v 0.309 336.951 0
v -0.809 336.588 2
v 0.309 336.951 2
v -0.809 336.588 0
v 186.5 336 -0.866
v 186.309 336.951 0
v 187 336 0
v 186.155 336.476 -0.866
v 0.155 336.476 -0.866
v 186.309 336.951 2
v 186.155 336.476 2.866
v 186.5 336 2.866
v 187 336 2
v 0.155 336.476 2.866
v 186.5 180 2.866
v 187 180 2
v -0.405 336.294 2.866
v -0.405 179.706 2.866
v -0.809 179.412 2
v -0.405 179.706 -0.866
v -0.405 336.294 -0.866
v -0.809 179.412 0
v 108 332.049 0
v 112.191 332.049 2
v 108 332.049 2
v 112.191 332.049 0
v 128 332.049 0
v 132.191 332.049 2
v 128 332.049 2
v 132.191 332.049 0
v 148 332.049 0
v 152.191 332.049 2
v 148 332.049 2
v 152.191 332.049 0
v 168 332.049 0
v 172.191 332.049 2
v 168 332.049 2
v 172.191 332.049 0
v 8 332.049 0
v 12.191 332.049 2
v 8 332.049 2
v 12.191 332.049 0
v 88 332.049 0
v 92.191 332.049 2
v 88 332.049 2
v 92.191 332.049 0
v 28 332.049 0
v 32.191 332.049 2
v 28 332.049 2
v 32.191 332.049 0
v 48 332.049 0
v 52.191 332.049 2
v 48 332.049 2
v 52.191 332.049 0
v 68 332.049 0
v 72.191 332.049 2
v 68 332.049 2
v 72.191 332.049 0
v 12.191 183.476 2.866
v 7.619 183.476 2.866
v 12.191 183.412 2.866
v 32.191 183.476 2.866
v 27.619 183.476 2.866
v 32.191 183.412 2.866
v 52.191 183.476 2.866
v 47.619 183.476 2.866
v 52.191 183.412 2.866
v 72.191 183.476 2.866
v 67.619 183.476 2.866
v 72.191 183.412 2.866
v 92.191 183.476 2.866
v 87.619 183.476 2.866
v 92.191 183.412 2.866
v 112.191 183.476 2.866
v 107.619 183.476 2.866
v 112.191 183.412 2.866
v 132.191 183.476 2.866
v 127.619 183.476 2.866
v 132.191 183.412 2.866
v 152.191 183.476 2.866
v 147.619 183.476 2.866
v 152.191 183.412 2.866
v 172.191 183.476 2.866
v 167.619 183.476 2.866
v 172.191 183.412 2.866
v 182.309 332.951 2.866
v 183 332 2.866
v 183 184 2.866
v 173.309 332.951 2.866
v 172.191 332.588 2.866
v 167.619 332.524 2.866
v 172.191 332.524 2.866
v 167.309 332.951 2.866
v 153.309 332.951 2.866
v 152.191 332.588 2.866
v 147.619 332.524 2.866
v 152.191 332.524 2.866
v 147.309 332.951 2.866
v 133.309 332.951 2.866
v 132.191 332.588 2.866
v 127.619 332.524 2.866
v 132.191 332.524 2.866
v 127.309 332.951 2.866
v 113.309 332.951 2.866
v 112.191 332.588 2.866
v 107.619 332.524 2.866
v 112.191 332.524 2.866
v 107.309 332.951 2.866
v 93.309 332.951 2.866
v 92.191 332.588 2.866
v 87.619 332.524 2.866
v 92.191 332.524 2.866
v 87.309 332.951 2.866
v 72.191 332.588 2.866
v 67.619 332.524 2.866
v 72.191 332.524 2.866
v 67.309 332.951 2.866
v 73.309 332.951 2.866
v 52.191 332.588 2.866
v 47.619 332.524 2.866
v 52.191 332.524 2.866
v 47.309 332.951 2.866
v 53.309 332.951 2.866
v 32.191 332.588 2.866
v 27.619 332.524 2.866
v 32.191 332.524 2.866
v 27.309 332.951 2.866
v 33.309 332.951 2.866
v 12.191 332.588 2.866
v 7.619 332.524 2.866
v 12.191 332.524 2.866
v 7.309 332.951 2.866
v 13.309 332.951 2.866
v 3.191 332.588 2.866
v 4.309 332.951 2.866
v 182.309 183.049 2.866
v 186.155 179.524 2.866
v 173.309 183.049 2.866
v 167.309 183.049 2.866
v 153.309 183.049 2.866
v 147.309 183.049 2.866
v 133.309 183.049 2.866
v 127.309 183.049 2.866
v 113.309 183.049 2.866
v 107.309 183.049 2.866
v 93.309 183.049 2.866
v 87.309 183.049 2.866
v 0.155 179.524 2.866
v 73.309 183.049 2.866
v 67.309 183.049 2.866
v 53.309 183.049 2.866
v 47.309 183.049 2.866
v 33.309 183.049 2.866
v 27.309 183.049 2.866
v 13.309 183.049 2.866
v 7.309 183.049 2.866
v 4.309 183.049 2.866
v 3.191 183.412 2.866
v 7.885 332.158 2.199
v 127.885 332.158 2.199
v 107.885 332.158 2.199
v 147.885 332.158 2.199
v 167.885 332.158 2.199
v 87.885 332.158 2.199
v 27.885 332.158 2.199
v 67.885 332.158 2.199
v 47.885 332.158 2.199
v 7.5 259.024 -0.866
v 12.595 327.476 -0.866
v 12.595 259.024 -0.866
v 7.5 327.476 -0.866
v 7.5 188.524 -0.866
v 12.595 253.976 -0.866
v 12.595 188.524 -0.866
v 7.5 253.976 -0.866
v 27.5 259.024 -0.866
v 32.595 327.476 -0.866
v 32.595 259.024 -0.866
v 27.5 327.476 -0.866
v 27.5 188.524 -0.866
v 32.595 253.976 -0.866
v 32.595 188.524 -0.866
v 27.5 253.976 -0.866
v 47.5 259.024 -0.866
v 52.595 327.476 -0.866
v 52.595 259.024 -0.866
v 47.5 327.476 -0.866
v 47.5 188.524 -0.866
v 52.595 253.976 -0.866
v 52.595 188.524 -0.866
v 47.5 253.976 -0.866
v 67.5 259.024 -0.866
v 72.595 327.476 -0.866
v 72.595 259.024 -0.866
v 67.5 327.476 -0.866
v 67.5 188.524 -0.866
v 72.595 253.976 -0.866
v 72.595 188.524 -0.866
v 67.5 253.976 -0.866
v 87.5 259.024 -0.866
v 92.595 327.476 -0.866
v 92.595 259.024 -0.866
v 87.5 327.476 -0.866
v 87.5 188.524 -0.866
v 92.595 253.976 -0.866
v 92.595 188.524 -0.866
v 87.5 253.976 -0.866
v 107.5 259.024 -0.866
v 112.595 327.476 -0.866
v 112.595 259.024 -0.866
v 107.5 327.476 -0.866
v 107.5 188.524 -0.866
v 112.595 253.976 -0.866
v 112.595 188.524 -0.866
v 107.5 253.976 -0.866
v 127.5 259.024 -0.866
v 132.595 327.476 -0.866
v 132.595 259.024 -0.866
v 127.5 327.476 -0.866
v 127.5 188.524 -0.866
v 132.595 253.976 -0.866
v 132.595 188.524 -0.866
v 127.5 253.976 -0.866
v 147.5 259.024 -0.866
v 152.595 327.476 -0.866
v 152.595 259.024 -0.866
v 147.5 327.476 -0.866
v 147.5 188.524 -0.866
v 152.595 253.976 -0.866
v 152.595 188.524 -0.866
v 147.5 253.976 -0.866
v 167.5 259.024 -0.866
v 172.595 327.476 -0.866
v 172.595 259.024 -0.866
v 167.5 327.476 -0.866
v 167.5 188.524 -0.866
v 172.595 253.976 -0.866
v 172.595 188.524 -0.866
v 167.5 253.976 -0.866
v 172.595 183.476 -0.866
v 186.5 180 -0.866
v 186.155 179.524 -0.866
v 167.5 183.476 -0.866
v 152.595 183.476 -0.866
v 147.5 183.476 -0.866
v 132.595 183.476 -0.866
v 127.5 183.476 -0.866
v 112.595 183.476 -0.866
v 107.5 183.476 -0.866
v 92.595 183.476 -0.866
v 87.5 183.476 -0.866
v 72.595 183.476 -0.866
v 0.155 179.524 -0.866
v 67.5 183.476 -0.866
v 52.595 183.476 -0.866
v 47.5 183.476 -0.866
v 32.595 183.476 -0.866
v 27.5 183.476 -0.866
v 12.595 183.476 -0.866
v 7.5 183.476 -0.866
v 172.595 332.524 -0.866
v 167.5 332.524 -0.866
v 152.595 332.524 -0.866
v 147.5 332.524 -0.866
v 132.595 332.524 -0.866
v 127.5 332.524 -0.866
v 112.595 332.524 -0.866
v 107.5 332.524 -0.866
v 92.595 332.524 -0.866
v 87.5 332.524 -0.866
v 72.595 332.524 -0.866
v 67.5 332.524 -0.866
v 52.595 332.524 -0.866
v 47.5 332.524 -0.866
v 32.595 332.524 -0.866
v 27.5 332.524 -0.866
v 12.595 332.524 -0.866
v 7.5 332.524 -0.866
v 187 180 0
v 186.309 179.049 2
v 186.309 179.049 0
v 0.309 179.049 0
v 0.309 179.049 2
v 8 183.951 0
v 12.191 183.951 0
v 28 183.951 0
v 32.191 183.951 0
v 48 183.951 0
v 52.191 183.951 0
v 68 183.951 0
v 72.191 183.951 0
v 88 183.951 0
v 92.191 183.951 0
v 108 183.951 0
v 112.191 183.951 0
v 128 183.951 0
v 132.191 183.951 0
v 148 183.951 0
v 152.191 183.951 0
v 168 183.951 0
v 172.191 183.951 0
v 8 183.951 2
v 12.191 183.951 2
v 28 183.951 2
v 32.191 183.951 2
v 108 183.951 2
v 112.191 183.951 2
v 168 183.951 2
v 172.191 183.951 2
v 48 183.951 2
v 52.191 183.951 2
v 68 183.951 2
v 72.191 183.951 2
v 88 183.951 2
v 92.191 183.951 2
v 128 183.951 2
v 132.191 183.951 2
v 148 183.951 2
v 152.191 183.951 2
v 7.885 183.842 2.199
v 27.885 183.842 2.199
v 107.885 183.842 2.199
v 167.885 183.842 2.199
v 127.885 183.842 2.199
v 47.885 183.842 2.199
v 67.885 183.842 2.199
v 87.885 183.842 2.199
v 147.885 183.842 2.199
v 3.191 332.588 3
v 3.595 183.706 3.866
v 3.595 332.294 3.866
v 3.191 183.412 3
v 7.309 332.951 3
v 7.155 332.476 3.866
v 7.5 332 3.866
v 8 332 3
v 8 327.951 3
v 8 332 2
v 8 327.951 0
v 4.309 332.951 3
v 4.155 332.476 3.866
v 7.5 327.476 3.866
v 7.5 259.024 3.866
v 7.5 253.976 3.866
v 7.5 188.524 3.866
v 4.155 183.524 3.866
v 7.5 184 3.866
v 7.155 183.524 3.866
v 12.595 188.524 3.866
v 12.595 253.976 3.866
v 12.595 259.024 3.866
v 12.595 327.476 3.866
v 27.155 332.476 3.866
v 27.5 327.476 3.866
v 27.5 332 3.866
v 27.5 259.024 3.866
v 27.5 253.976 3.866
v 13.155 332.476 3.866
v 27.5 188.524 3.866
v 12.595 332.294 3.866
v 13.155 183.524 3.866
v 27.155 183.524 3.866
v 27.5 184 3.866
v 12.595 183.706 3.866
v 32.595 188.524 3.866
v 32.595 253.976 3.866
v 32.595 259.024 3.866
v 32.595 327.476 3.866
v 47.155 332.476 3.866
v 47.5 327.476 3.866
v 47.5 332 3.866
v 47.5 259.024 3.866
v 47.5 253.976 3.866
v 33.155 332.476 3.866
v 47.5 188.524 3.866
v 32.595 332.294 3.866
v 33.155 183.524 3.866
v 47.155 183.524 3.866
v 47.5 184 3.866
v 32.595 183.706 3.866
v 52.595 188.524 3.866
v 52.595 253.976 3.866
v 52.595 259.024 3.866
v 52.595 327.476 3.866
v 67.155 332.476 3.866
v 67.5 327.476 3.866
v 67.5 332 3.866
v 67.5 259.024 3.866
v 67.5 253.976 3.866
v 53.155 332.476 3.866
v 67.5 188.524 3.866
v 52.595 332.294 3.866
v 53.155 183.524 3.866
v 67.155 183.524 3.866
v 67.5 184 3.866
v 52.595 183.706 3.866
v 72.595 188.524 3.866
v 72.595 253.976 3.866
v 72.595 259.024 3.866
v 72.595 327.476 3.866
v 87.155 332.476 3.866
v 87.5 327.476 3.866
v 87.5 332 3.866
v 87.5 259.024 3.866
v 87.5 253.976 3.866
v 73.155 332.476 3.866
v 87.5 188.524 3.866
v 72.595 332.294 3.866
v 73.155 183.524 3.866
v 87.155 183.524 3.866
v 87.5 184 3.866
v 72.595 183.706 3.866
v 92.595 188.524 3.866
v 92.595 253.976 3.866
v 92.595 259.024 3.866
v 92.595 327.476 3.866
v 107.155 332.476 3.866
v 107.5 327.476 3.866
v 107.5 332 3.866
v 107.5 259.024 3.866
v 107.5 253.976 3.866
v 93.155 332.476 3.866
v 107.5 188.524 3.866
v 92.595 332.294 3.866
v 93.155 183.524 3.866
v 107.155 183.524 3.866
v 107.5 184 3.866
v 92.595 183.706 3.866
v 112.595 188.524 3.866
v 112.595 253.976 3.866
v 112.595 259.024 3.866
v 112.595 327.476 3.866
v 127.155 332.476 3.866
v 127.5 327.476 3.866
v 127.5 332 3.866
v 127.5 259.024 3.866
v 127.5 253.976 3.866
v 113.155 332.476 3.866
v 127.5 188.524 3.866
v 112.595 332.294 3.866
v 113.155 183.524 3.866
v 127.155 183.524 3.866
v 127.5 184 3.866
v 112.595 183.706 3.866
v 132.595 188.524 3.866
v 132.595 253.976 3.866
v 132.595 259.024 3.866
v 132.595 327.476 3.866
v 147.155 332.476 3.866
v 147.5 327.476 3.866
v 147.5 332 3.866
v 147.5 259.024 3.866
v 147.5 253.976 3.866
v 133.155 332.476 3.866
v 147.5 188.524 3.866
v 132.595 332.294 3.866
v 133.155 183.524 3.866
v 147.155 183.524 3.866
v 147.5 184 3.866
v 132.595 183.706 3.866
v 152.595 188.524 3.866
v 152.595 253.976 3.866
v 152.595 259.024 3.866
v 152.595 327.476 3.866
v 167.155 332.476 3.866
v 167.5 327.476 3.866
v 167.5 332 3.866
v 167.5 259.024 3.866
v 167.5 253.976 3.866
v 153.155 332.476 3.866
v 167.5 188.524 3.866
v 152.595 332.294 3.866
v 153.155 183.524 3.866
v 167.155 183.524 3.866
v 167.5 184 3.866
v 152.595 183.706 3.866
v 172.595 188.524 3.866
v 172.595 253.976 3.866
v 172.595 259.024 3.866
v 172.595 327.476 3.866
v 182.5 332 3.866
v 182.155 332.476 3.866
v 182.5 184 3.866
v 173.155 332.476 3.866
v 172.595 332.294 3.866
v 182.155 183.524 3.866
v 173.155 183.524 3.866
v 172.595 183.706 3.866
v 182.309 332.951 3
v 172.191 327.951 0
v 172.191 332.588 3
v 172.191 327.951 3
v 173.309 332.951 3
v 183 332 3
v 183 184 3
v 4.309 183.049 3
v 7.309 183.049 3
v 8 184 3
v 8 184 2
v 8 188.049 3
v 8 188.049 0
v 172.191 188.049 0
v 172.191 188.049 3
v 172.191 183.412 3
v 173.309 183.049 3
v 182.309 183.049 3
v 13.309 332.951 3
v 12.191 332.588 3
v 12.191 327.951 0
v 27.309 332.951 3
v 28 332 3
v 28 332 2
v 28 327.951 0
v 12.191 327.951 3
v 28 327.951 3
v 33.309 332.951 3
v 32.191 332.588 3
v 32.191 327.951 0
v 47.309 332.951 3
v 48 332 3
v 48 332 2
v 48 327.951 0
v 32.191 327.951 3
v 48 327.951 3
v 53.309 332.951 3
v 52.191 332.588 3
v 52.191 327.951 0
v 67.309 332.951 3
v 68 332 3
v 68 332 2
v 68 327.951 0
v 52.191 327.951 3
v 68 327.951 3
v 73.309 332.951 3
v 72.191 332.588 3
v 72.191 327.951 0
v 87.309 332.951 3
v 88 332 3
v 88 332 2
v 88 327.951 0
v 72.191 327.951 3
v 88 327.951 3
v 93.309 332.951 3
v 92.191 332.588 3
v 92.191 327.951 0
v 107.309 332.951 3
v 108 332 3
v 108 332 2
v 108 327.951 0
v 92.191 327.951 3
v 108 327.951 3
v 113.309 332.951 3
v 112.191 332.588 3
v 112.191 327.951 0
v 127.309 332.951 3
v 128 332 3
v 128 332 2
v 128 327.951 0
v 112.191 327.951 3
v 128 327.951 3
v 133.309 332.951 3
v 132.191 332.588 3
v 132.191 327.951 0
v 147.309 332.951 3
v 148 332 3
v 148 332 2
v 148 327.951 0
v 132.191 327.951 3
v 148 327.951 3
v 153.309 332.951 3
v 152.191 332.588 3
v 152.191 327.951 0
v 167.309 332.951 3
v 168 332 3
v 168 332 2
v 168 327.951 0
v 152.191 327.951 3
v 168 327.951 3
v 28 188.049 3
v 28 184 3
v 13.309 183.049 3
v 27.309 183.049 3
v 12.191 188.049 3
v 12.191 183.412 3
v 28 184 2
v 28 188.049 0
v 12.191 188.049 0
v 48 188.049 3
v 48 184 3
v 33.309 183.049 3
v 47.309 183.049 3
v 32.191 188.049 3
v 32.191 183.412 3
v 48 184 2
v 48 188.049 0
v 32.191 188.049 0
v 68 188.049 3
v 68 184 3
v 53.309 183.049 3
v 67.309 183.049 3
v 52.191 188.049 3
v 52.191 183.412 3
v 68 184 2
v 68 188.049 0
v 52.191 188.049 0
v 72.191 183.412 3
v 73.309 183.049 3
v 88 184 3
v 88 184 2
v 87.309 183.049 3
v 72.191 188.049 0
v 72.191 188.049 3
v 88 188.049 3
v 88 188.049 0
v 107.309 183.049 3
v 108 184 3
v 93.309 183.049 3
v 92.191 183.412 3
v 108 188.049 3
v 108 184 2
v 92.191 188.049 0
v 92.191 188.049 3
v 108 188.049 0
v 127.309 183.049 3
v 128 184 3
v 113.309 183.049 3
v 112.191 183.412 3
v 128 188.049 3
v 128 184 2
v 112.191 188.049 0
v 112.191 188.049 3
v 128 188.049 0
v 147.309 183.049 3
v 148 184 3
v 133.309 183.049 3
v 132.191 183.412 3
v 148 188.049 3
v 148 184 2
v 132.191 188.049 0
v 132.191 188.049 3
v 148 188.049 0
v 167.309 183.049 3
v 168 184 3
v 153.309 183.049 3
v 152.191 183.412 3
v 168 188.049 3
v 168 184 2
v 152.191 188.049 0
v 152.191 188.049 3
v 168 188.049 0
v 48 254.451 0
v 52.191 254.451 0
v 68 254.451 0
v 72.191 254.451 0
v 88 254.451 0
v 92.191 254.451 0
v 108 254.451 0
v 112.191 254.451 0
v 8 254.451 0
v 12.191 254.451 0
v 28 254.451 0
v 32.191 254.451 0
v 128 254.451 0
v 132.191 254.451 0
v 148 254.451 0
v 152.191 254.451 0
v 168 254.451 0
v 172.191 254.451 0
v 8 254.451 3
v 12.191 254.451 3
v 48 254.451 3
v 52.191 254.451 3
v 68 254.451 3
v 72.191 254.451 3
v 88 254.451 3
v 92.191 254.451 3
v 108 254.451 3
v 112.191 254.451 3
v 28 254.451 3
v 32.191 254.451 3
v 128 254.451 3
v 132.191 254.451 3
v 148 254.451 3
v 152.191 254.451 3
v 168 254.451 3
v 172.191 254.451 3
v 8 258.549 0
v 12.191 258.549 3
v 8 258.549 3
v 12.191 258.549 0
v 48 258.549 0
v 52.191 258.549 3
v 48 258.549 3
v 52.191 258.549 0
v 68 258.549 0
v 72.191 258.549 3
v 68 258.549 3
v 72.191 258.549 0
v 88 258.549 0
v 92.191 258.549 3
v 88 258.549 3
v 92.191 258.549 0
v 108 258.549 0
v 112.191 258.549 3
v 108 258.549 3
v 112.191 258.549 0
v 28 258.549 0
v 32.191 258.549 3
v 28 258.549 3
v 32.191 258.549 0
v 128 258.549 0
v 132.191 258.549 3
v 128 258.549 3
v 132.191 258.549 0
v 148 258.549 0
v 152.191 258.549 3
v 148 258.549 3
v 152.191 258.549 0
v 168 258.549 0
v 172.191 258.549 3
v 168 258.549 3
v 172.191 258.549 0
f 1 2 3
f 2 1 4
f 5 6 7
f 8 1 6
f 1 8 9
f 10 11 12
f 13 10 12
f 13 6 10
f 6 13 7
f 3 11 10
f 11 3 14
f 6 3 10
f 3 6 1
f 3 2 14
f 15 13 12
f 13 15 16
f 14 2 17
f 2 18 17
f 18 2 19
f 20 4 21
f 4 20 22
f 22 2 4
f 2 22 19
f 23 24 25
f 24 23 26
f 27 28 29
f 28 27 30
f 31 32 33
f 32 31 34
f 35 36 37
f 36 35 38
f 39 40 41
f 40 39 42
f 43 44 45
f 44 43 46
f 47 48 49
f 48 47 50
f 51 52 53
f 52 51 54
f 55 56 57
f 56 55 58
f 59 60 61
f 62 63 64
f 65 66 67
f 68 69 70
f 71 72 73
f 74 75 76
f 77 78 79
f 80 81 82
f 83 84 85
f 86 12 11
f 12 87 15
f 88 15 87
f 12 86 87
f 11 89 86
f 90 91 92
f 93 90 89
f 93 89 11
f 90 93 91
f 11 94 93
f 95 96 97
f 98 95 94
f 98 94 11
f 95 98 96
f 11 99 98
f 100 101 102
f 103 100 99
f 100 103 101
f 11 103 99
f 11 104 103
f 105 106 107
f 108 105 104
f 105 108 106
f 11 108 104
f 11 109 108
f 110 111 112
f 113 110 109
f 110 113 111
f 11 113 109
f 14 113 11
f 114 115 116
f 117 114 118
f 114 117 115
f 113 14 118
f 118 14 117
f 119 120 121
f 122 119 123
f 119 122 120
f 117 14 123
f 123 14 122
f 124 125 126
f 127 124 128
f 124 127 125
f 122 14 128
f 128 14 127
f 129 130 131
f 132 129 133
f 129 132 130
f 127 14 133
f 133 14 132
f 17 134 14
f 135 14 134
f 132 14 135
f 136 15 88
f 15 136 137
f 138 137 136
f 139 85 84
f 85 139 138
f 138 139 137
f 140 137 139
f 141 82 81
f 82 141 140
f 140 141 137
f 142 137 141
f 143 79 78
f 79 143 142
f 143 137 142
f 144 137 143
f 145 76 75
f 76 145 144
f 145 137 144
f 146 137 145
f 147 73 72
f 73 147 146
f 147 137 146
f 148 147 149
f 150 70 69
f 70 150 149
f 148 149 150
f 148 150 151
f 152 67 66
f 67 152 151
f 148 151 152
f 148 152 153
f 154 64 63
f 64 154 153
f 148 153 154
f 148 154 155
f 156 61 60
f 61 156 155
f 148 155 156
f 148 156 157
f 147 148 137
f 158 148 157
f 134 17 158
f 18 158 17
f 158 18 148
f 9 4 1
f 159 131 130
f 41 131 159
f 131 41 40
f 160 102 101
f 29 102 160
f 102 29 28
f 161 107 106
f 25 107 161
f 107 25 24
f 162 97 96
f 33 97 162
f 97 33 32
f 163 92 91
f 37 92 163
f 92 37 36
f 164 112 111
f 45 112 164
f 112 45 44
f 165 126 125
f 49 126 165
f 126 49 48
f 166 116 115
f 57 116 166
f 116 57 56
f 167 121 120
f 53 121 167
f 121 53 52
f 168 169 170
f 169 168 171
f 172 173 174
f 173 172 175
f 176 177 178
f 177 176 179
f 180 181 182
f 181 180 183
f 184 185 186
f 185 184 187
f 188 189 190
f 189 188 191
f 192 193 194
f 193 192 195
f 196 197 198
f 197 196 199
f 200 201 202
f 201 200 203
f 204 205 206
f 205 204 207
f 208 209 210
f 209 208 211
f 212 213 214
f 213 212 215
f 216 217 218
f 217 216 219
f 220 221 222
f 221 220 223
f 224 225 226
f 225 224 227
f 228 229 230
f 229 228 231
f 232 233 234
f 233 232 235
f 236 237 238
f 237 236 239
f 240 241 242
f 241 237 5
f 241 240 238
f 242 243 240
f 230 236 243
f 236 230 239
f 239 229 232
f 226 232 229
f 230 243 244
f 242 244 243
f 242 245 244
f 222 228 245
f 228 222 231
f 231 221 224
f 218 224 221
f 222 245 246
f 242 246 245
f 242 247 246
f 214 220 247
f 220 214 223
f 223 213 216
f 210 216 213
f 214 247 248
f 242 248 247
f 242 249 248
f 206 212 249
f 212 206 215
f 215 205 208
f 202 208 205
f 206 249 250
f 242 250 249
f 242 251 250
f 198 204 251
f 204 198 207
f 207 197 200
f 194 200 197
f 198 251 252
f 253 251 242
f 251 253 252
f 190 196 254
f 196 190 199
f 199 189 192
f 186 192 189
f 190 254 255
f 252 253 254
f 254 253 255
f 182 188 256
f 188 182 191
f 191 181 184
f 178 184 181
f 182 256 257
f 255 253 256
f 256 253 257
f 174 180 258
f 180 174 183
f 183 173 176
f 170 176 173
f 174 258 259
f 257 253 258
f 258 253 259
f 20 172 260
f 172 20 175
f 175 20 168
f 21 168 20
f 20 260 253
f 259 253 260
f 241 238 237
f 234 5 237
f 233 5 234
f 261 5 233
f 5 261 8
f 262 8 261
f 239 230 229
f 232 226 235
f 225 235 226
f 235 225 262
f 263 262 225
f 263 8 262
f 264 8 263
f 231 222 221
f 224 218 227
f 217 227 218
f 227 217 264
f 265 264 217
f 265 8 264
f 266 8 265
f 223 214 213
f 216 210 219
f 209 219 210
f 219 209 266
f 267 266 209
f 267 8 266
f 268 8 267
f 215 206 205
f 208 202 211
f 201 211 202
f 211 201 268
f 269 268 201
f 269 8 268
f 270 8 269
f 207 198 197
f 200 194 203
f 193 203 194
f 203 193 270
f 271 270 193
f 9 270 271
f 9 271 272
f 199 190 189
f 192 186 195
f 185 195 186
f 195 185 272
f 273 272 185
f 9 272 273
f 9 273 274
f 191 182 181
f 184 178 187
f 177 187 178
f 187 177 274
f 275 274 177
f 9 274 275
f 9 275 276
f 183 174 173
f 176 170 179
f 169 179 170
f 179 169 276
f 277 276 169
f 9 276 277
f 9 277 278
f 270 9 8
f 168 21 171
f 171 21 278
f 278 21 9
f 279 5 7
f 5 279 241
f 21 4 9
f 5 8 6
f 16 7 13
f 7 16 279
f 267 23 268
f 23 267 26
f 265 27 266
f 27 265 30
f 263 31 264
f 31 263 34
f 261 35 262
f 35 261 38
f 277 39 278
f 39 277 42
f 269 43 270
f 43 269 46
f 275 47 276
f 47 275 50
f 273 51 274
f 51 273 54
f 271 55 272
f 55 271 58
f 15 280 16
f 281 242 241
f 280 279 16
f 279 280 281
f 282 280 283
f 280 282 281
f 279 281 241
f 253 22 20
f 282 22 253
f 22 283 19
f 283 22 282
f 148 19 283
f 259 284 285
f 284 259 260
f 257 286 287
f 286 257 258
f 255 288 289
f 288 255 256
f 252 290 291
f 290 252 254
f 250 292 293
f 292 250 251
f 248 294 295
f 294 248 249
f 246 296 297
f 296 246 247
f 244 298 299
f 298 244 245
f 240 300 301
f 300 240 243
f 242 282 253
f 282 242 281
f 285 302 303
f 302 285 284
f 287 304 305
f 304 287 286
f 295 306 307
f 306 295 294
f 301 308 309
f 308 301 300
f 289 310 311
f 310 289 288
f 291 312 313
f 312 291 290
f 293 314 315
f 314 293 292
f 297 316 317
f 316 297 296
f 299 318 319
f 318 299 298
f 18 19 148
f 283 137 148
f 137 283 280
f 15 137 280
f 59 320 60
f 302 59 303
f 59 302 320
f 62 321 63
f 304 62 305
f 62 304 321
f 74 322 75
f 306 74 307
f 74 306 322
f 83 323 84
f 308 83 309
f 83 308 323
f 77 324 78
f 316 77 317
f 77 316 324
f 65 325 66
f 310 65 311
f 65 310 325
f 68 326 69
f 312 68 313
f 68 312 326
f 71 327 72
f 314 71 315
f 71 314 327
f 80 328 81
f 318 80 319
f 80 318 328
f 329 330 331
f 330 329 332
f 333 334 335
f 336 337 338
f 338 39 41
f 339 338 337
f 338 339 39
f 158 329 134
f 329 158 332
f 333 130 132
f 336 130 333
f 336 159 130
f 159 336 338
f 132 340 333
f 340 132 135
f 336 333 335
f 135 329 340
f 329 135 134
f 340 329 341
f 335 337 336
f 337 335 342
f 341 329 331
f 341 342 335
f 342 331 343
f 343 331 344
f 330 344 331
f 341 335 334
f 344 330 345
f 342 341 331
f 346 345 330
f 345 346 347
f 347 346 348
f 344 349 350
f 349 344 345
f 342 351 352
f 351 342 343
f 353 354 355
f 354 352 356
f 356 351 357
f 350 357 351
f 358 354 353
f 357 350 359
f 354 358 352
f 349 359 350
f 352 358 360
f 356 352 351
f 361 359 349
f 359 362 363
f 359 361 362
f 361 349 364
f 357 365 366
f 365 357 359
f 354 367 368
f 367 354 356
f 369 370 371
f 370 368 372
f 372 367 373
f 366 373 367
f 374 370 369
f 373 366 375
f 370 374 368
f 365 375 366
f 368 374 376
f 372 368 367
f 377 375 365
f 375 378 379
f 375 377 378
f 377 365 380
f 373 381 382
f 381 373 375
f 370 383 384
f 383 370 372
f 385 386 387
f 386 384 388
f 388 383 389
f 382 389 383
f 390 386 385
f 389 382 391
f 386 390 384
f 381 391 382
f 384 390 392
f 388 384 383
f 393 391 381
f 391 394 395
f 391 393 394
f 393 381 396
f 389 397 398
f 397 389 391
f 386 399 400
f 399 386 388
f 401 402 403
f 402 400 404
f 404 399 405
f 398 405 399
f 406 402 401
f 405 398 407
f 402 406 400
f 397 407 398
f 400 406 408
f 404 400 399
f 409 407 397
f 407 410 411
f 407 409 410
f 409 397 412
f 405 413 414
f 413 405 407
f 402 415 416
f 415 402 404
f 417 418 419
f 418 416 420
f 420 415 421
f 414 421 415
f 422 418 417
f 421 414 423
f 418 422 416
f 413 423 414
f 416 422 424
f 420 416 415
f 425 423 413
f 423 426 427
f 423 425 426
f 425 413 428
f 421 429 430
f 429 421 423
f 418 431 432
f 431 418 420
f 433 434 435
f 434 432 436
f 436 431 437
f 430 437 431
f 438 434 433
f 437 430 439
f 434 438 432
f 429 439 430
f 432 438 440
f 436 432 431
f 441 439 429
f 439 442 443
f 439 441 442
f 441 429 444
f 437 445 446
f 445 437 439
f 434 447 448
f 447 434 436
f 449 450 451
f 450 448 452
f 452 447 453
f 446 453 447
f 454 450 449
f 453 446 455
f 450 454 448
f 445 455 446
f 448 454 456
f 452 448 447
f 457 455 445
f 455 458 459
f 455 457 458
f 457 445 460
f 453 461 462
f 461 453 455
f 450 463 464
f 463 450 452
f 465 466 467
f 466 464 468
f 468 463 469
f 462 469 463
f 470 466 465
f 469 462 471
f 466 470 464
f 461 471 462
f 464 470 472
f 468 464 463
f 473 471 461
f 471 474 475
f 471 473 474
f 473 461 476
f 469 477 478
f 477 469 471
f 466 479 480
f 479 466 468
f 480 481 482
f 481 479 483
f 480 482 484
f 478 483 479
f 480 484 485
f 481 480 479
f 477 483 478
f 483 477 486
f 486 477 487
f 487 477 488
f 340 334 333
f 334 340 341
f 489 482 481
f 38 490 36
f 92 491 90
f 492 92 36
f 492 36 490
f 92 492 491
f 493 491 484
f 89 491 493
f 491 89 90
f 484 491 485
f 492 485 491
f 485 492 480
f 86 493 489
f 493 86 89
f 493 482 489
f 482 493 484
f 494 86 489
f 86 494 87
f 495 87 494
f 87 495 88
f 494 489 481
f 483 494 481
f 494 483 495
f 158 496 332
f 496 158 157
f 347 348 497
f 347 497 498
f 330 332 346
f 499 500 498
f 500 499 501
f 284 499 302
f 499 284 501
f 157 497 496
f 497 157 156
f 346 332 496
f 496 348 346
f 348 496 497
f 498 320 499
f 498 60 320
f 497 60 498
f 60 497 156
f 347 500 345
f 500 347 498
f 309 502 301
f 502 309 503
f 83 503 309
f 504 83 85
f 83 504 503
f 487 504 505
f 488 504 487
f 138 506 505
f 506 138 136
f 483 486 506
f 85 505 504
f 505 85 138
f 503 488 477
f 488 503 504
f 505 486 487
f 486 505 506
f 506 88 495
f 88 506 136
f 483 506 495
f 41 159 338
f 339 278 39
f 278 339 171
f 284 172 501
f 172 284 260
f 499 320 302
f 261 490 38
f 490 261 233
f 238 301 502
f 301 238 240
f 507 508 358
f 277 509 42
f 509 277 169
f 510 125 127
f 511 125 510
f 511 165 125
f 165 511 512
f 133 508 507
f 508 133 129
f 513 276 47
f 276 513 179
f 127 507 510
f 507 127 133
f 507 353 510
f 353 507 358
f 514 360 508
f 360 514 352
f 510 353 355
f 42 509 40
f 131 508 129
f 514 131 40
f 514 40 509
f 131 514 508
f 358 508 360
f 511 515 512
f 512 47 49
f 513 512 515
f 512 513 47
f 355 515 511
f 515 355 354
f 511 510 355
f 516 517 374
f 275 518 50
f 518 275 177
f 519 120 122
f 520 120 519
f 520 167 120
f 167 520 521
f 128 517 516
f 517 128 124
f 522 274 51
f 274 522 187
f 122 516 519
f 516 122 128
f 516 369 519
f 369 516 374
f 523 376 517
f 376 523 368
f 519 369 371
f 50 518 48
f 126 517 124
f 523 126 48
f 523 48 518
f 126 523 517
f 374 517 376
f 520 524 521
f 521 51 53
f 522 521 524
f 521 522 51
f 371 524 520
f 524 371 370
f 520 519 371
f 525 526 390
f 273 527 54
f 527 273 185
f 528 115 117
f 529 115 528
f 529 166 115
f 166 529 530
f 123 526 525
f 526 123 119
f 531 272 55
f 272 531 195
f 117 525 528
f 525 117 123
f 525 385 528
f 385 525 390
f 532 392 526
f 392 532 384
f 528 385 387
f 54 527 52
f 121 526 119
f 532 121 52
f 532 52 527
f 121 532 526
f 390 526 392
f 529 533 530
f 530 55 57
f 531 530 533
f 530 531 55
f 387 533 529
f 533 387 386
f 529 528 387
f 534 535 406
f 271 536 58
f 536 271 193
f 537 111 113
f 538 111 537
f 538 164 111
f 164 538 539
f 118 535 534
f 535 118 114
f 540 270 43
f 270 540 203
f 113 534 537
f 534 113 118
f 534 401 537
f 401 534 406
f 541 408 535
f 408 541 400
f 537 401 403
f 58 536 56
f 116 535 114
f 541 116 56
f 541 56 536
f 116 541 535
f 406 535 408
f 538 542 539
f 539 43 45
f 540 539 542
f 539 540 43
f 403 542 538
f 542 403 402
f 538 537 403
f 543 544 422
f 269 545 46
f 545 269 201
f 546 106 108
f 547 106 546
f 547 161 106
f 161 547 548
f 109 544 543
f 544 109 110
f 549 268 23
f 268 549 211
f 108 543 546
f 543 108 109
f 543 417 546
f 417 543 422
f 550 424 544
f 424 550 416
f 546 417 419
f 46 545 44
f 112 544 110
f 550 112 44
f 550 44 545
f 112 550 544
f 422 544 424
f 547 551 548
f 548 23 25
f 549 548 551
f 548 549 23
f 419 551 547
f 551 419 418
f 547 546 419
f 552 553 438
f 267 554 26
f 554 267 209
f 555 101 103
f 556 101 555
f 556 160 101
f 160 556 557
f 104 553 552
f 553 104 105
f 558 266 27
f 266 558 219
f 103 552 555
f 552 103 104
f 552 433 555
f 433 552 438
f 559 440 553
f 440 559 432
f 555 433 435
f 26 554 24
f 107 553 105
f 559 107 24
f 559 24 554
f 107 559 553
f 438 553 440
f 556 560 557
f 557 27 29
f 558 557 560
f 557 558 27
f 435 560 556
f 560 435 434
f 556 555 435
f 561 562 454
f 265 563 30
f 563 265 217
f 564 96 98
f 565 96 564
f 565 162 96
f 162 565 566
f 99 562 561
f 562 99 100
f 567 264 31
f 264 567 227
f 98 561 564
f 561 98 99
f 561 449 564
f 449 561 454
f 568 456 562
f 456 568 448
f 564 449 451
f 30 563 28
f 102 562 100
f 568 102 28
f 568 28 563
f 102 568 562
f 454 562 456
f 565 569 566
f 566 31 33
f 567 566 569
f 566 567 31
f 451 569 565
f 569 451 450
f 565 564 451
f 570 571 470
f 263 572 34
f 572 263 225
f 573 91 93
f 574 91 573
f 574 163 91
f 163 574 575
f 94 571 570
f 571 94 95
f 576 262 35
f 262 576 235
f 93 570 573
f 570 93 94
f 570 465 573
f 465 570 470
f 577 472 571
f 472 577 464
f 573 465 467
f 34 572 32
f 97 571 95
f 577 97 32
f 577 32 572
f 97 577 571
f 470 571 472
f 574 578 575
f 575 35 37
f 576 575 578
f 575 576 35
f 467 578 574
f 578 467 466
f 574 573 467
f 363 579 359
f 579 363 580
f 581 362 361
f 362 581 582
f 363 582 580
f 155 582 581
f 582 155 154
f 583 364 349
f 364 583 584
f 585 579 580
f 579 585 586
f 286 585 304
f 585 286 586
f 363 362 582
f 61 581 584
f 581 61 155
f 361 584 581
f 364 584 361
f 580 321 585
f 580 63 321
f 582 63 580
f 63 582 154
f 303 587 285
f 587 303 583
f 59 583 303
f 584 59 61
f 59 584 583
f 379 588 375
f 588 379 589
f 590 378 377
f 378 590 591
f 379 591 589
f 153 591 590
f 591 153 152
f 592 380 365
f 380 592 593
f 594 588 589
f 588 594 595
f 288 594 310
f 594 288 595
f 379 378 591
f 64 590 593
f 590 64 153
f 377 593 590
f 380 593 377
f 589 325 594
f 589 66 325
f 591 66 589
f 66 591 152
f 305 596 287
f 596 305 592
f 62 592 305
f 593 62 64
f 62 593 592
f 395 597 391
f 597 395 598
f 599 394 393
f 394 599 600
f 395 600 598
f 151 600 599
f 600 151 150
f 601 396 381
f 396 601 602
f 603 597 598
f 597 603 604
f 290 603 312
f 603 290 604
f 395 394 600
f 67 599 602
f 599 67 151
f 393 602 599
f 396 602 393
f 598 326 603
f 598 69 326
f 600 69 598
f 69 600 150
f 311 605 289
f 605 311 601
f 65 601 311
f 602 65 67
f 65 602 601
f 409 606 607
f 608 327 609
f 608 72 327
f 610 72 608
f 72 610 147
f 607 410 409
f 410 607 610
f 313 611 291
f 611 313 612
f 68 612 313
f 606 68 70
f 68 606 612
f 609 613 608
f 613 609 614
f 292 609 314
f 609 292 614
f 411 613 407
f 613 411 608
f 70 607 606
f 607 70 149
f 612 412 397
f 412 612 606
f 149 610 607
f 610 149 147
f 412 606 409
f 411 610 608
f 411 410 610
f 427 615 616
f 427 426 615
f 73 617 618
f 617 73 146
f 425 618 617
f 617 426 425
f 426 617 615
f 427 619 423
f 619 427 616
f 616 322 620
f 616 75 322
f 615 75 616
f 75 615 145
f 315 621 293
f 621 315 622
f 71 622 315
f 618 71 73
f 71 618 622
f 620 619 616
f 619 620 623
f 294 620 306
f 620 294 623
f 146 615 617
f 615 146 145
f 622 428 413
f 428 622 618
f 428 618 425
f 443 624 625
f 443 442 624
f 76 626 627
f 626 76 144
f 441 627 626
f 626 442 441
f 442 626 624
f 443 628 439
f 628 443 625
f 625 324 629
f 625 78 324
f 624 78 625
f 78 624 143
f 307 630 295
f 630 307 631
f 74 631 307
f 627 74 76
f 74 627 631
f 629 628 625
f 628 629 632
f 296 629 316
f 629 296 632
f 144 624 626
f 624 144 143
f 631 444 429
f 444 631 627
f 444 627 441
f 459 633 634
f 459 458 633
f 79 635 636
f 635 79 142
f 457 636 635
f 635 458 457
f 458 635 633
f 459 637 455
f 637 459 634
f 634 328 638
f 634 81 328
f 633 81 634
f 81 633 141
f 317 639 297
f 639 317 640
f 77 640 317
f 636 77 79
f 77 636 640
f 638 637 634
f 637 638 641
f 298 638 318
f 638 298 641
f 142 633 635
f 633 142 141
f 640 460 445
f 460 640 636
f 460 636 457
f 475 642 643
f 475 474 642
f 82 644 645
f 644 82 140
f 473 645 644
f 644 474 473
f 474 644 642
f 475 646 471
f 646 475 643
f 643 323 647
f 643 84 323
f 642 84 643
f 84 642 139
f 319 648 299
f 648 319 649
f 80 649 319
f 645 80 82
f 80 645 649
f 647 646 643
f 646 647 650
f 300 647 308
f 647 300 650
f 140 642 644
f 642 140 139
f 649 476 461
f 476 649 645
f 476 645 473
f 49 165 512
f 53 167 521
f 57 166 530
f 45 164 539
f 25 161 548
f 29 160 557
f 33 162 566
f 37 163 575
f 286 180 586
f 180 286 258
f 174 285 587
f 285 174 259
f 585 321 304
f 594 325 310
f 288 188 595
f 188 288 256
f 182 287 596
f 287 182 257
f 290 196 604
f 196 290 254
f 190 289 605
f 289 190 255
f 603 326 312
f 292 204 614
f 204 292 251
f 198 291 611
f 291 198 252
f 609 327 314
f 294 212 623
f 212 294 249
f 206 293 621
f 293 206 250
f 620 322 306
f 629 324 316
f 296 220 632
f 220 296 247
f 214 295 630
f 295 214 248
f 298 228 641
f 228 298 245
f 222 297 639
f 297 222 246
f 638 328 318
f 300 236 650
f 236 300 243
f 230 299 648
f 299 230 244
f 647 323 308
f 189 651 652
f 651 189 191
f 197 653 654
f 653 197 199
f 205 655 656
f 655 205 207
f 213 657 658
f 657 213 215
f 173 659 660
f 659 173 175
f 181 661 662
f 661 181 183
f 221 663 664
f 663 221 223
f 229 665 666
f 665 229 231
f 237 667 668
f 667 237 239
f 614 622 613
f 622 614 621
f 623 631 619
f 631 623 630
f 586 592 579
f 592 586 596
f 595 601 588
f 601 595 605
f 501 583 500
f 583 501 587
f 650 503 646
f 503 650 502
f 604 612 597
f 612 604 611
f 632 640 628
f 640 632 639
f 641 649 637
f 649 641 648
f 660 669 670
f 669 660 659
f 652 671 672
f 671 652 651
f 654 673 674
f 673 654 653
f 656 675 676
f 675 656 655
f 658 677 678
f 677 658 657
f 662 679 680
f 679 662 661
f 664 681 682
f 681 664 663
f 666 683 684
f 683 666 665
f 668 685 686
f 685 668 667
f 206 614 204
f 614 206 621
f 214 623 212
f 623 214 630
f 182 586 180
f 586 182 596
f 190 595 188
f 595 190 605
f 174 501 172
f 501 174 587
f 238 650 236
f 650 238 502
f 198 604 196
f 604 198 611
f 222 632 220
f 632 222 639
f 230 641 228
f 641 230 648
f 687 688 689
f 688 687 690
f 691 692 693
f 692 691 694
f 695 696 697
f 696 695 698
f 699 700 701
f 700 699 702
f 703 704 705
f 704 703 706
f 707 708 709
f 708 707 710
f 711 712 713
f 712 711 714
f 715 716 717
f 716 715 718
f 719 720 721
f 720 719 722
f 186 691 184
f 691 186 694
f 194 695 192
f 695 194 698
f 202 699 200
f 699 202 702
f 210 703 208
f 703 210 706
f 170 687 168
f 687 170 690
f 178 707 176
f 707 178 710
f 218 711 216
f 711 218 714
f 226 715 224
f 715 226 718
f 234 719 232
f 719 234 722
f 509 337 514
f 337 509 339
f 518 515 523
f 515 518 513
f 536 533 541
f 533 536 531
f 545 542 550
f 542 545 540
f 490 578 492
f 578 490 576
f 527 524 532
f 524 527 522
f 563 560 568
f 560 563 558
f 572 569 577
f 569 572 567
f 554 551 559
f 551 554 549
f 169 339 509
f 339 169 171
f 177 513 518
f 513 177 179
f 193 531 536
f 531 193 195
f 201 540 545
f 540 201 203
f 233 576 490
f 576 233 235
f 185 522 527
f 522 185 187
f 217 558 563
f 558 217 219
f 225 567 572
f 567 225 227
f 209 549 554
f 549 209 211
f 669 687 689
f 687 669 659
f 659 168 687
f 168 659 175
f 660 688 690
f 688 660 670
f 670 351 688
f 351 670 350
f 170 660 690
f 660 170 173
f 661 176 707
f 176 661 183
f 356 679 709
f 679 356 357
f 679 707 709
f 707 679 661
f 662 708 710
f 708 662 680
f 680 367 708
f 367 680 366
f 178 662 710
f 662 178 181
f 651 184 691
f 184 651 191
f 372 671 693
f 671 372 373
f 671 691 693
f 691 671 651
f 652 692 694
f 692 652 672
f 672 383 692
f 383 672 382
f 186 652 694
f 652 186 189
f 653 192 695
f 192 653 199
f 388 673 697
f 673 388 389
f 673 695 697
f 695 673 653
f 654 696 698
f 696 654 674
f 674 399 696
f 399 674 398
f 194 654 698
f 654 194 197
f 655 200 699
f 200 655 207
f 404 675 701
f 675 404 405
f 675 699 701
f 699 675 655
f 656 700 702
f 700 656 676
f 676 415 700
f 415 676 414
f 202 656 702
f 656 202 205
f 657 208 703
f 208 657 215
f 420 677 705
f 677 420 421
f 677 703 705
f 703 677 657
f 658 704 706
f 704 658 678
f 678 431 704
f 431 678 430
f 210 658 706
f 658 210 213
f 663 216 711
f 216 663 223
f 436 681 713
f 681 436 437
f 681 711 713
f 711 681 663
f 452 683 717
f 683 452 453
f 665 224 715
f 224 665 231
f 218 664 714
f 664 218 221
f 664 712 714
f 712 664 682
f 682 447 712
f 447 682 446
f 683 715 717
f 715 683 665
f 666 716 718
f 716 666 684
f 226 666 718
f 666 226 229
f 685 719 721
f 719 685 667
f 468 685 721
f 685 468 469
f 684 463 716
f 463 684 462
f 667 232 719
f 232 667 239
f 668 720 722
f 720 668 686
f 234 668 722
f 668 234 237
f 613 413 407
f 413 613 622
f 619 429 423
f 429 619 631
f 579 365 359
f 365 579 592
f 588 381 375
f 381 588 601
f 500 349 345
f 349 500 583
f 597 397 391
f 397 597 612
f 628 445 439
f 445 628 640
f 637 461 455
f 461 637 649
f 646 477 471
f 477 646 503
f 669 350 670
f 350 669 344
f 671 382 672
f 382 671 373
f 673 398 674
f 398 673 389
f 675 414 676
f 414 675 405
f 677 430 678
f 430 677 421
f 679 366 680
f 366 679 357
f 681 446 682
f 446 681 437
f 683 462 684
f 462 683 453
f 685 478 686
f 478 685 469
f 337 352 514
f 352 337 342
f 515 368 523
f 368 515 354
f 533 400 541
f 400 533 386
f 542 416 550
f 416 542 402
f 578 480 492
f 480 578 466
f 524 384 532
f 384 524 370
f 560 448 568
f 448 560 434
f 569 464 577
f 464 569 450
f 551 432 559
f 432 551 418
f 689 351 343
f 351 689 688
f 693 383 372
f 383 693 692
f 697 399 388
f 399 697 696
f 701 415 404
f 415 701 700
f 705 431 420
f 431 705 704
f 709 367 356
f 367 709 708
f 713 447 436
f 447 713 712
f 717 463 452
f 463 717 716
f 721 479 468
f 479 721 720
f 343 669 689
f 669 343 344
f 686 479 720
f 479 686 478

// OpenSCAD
minkowskiRadius = 1;

/*
  x - inner width of box - X
  y - inner length of box (Size of edge with the outlet cord) - Y
  height - inner height of box - Z
  wallThickness - Thickness of walls of the box
  cutoutSpacing - Spacing between cutouts for usb cord exits
  cutoutWidth - Width of the cutout for USB cables
  chargerX - Width of the charger
  chargerY - Length of the charger (Size of the edge with the outlet cord)
  chargerHeight - Height of charger
  outletCutoutWidth - Width of the cutout for the power cord
*/
module mainBox(x, y, height, wallThickness, cutoutSpacing, cutoutWidth, chargerX, chargerY, chargerHeight, outletCutoutWidth) {
  innerX = x + minkowskiRadius * 2;
  innerY = y + minkowskiRadius * 2;
  innerHeight = height + minkowskiRadius * 2;
  assert(innerHeight > wallThickness);
  outerX = innerX + wallThickness * 2;
  outerY = innerY + wallThickness * 2;
  outerHeight = innerHeight + wallThickness;
  slotOverhang = 0.2; // excess size so the slots will fully cutout
  outletCutoutWidth = outletCutoutWidth ? outletCutoutWidth : 10;


  difference() {
    cube([outerX, outerY, outerHeight]);
    translate([wallThickness, wallThickness, wallThickness])
      #cube([innerX, innerY, innerHeight + slotOverhang]);
    // side slots
    for (x = [wallThickness + cutoutWidth/2 : cutoutSpacing : innerX]) {
      translate([x, -slotOverhang/2, wallThickness * 1.5])
        #cube([cutoutWidth, wallThickness + slotOverhang, innerHeight - wallThickness * 2]);
      translate([x, outerY - wallThickness - slotOverhang/2, wallThickness * 1.5])
        #cube([cutoutWidth, wallThickness + slotOverhang, innerHeight - wallThickness * 2]);
    }
    // Power cord cutout
    translate([0 - slotOverhang/2, outerY/2 - outletCutoutWidth/2, wallThickness])
      #cube([wallThickness + slotOverhang, outletCutoutWidth, innerHeight - wallThickness]);
  }
  
  translate([wallThickness, (wallThickness + innerY - chargerY)/2, wallThickness])
    difference() {
        cube([chargerX + wallThickness, chargerY + wallThickness, chargerHeight]);
        translate([0, wallThickness/2, 0])
            cube([chargerX + wallThickness/2, chargerY, chargerHeight]);
    }
}

module boxLid(x, y, wallThickness, cutoutSize, cutoutSpacing) {
  cutoutOverhang = 0.2;
  outerX = x + wallThickness * 2 + minkowskiRadius * 2;
  outerY = y + wallThickness * 2 + minkowskiRadius * 2;
  perimeterHeight = wallThickness;
  fullHeight = wallThickness * 1.5;
  difference() {
    union() {
      cube([outerX, outerY, perimeterHeight]);
      translate([wallThickness + minkowskiRadius * 2, wallThickness + minkowskiRadius * 2, 0])
        cube([x - minkowskiRadius * 2, y - minkowskiRadius * 2, fullHeight]);
    }
    // cutouts for top dividers
    for (cutoutX = [wallThickness * 3 : cutoutSpacing : outerX]) {
      translate([cutoutX + minkowskiRadius, wallThickness + minkowskiRadius, -cutoutOverhang/2])
        #cube([cutoutSize + minkowskiRadius, cutoutSize + minkowskiRadius, fullHeight + cutoutOverhang]);
      translate([cutoutX + minkowskiRadius, outerY - wallThickness - cutoutSize - minkowskiRadius * 2, -cutoutOverhang/2])
        #cube([cutoutSize + minkowskiRadius, cutoutSize + minkowskiRadius, fullHeight + cutoutOverhang]);
        translate([cutoutX + minkowskiRadius, (outerY - wallThickness - cutoutSize - minkowskiRadius * 2)/2, -cutoutOverhang/2])
        #cube([cutoutSize + minkowskiRadius, cutoutSize + minkowskiRadius, fullHeight + cutoutOverhang]);
    }
  }

}

/*
minkowski() {
  mainBox(
    x = 180,
    y = 150,
    height = 32,
    wallThickness = 3,
    cutoutSpacing = 20,
    cutoutWidth = 10,
    chargerX = 80,
    chargerY = 130,
    chargerHeight = 8,
    outletCutoutWidth = 20
  );
  sphere(r=minkowskiRadius);
}
*/

minkowski() {
  translate([0, 180, 0])
    boxLid(
      x = 180,
      y = 150,
      wallThickness = 2,
      cutoutSize = 5,
      cutoutSpacing = 20
    );
  sphere(r=minkowskiRadius);
}
